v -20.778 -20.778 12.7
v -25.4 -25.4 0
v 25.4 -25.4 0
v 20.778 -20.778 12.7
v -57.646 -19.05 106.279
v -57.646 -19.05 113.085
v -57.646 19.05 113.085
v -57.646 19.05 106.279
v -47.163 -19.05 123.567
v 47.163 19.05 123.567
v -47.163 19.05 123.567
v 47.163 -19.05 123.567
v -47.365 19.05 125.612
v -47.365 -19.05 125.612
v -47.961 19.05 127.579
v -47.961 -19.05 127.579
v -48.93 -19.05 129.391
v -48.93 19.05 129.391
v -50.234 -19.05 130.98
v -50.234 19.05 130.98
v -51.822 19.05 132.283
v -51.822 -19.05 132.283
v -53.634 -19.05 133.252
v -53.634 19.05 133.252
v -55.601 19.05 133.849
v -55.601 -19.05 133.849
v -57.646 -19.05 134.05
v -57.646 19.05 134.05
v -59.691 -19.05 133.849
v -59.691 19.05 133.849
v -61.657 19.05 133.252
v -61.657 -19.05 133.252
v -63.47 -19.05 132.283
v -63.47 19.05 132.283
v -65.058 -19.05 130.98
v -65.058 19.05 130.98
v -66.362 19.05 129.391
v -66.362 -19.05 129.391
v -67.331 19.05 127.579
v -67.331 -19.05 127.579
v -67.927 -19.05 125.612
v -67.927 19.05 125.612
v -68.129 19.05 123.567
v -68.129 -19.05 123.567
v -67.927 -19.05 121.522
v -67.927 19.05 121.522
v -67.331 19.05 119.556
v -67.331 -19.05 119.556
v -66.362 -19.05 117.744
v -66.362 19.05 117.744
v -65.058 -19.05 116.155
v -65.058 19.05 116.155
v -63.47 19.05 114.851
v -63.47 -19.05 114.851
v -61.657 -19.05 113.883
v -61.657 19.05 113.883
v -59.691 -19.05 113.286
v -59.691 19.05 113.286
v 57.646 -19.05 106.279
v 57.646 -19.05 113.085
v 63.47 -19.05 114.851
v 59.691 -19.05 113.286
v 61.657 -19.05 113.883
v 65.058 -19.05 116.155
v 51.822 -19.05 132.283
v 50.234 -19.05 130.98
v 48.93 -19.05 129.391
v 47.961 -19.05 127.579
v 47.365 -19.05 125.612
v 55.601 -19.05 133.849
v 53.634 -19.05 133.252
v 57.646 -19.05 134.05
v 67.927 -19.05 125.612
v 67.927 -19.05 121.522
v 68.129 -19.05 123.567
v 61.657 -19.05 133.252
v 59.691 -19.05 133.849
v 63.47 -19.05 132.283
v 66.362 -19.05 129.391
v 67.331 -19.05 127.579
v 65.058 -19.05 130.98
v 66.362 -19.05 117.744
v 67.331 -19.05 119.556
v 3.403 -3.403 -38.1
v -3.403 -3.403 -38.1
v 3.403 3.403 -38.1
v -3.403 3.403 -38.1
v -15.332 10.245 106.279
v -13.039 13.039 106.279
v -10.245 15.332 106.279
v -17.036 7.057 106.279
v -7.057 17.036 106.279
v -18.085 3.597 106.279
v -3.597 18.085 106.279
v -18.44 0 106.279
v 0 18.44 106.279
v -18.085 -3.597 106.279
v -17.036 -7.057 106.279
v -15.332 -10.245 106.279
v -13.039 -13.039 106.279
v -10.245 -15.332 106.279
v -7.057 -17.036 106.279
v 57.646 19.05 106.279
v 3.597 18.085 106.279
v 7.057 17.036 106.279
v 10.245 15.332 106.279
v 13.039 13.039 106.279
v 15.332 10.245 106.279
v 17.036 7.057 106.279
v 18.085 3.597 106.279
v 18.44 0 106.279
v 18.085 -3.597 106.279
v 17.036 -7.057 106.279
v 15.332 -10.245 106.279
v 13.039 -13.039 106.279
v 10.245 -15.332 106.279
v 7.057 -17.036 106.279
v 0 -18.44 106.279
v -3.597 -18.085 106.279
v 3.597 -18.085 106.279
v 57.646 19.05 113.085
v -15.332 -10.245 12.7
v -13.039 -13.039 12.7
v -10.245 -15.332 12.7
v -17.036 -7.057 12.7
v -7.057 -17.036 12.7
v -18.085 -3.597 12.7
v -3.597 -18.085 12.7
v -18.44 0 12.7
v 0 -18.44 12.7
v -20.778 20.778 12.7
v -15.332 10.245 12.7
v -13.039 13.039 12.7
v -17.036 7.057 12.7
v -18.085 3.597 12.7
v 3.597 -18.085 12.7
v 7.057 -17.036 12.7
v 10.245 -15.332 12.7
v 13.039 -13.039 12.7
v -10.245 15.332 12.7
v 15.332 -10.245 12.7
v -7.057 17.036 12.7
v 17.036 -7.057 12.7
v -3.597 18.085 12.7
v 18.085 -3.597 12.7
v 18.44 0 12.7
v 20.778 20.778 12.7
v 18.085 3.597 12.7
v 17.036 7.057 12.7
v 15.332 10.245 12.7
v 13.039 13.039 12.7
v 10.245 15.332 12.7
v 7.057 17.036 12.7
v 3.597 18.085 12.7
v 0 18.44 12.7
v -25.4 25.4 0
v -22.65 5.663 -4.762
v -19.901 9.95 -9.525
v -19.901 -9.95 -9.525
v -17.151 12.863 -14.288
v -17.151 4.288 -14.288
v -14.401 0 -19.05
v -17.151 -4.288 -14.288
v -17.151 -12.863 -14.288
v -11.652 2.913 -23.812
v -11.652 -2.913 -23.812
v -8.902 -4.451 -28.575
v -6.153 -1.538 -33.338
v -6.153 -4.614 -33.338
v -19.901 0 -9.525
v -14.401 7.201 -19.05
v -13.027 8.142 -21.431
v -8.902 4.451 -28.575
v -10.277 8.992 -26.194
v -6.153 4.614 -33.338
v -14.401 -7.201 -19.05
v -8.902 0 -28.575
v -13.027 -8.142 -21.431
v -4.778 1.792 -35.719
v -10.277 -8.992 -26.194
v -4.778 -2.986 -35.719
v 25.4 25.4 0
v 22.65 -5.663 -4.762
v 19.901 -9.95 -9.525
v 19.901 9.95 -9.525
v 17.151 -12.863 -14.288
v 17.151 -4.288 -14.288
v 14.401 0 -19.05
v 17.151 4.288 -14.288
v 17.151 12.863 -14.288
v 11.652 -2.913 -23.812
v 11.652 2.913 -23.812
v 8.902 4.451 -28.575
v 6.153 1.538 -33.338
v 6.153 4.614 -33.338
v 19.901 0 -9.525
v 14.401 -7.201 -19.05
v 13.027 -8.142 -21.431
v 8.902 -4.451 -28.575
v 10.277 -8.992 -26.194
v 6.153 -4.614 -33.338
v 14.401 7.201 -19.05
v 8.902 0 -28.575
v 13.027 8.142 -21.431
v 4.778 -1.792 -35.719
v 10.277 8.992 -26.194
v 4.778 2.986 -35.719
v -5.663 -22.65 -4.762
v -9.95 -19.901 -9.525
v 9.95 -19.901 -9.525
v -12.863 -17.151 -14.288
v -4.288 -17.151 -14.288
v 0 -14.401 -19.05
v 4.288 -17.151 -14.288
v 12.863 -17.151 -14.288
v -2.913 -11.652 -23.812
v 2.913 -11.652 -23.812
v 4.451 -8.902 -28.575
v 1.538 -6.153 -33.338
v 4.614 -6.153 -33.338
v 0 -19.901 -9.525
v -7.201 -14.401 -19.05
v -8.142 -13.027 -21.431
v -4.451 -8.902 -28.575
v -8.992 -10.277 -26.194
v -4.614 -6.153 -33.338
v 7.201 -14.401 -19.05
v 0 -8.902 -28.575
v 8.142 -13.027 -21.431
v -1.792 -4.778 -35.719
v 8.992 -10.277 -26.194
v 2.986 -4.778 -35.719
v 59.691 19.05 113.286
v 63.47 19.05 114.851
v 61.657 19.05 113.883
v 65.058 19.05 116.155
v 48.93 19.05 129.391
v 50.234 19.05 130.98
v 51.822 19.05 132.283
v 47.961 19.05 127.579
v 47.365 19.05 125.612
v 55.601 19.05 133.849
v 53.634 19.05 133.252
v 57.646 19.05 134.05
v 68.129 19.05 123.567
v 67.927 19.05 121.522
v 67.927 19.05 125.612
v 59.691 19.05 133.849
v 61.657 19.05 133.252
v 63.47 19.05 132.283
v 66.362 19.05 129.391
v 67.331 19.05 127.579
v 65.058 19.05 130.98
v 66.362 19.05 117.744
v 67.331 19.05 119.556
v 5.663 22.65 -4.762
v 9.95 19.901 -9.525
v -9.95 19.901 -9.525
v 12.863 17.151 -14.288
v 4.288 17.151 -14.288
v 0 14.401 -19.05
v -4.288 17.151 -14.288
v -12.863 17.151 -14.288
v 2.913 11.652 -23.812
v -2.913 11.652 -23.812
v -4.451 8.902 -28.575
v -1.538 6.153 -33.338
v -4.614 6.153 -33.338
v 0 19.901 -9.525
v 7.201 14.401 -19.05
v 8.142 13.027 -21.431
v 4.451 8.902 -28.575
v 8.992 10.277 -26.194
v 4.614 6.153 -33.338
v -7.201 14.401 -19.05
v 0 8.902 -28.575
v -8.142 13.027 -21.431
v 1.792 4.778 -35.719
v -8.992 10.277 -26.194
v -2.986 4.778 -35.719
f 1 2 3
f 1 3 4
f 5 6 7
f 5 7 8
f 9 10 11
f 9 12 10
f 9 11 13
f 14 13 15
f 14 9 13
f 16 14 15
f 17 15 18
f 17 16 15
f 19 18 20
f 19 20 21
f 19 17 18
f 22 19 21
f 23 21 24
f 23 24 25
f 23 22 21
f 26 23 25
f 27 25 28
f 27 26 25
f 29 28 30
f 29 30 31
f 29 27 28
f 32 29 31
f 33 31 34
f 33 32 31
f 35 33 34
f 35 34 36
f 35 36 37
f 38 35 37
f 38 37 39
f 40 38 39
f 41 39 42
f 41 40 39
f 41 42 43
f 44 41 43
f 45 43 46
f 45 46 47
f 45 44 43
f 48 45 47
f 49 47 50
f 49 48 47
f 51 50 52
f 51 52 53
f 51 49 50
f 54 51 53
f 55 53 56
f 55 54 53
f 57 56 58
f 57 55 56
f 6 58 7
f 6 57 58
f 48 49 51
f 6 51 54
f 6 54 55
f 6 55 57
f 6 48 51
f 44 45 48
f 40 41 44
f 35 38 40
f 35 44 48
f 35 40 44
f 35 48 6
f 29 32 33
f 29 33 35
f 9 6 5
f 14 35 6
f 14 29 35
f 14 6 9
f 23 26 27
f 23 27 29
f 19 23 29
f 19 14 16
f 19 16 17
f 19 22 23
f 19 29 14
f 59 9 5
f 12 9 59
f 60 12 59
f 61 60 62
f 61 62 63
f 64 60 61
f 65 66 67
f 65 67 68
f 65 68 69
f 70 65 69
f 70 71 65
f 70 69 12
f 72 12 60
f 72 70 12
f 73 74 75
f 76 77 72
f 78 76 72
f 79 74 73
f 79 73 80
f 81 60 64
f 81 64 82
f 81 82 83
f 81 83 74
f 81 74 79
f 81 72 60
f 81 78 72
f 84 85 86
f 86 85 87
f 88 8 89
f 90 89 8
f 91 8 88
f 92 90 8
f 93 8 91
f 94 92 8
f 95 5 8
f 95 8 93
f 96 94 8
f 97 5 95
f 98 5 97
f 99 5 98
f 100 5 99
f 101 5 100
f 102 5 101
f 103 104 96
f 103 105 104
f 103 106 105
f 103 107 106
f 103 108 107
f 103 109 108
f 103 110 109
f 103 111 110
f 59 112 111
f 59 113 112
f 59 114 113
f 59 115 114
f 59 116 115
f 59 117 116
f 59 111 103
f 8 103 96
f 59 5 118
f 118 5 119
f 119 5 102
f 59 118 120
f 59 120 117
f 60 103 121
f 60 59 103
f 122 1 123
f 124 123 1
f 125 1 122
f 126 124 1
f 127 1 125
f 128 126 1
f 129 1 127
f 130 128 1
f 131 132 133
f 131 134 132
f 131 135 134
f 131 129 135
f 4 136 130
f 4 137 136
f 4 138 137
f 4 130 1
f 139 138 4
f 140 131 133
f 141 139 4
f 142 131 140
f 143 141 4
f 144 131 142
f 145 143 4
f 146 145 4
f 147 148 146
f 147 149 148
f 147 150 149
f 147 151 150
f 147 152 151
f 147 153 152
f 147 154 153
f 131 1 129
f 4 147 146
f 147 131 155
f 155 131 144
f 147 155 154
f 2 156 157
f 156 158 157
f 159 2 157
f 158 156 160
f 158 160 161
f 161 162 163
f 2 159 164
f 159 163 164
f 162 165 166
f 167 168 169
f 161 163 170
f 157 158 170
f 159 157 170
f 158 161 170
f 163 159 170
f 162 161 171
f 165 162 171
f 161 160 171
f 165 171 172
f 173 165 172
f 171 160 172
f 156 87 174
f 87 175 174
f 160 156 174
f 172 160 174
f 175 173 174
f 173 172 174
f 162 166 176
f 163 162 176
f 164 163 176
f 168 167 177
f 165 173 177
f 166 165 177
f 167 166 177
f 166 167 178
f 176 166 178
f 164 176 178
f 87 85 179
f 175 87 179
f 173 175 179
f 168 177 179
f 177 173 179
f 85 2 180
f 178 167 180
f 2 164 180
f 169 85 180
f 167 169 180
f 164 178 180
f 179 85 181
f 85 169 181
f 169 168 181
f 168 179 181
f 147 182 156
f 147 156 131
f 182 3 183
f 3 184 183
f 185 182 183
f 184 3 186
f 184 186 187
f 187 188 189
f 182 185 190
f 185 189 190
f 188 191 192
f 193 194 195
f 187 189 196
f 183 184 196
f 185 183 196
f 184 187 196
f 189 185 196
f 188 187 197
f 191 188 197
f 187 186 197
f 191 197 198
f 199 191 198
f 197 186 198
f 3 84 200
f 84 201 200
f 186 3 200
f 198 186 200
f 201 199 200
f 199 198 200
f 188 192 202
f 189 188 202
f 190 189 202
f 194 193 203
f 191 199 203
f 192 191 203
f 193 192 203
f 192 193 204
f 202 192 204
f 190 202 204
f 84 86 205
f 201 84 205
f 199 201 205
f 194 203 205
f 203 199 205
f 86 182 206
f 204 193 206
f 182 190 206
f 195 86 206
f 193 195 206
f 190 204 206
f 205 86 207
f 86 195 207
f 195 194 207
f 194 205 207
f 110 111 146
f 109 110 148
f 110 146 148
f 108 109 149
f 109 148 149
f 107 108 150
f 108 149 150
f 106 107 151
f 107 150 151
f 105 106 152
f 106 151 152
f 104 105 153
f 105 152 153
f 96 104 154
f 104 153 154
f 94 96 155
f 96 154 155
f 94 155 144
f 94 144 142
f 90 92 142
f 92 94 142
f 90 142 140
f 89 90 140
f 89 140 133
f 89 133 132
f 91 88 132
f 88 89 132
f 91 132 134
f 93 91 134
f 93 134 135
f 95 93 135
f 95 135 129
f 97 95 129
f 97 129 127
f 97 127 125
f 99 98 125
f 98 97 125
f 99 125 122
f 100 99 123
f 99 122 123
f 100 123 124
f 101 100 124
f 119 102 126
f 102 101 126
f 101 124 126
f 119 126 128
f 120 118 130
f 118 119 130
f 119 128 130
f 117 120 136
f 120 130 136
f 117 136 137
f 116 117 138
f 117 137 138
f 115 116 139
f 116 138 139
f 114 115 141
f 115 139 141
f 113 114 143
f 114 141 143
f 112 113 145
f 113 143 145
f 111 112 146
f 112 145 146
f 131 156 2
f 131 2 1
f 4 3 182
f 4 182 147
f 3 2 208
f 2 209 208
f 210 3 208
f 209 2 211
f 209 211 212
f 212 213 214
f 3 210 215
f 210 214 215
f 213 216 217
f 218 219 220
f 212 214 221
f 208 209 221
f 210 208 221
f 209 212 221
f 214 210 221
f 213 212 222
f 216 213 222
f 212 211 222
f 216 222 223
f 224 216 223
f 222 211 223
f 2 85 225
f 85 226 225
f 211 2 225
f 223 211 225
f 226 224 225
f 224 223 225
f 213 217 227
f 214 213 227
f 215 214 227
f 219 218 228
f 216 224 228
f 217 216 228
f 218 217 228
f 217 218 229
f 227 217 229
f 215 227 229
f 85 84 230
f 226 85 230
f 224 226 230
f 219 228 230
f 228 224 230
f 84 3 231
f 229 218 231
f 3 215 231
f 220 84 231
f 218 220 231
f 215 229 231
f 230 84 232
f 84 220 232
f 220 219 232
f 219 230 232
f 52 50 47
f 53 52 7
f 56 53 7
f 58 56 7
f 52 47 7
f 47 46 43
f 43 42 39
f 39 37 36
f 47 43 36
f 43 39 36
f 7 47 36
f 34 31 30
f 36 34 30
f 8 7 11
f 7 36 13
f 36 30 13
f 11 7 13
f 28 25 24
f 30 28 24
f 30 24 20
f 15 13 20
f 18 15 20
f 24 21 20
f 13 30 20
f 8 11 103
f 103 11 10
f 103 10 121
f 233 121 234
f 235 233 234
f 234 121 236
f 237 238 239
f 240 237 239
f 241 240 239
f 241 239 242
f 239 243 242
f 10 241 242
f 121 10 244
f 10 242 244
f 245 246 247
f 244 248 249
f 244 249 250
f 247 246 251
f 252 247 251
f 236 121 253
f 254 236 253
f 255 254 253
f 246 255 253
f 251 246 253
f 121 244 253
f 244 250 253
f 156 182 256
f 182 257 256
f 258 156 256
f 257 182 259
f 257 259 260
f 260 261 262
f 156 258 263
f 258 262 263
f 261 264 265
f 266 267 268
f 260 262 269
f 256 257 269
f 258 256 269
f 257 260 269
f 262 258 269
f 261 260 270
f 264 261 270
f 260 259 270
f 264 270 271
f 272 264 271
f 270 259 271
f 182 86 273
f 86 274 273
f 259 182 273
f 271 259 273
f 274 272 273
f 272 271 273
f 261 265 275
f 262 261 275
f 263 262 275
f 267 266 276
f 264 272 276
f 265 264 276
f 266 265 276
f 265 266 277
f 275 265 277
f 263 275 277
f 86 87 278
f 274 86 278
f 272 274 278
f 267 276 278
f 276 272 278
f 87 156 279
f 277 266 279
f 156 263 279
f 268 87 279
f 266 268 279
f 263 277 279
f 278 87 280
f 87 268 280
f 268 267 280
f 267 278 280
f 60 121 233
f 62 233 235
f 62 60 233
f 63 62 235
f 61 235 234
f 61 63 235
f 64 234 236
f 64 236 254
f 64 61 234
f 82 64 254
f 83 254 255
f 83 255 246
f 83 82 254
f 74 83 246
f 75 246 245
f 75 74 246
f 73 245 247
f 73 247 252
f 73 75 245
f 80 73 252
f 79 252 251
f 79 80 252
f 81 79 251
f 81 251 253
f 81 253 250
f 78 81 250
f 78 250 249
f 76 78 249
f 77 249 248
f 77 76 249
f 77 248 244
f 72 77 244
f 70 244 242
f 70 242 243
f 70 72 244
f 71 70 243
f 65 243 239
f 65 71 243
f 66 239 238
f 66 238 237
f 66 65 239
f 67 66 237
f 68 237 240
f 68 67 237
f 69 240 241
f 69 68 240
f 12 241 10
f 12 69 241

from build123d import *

# Parameters (mm, degrees)
F0_W      = 50.8
F0_H      = 50.8
F1_DEPTH  = 38.1
F1_TAPER  = 30
F1_FACE_W = 50.8
F1_FACE_H = 50.8
F2_DEPTH  = 12.7
F2_TAPER  = 20
F3_R      = 18.4397946344
F4_DEPTH  = 101.6
F6_DEPTH  = 19.05
F7_DEPTH  = 19.05


with BuildPart() as f1:
    # F0 (on Top) → F1 (new body)
    with BuildSketch(Plane.XY):
        Rectangle(F0_W, F0_H)
    extrude(amount=-F1_DEPTH, taper=F1_TAPER)

    # F1_face (on face) → F2 (join)
    with BuildSketch(Plane.XY):
        Rectangle(F1_FACE_W, F1_FACE_H)
    extrude(amount=F2_DEPTH, taper=F2_TAPER)

    # F3 (on face) → F4 (join)
    with BuildSketch(Plane.XY.offset(12.7)):
        Circle(F3_R)
    extrude(amount=F4_DEPTH)

    # F5 (on Front) → F6 (join, symmetric)
    with BuildSketch(Plane.XZ):
        with BuildLine():
            Line((47.1632888286, 123.5673576593), (-47.1632888286, 123.5673576593))
            ThreePointArc((-47.1632888286, 123.5673576593), (-65.0582543601, 130.9796950807), (-57.6459169388, 113.0847295492))
            Line((-57.6459169388, 113.0847295492), (-57.6459169388, 106.2794923782))
            Line((-57.6459169388, 106.2794923782), (57.6459169388, 106.2794923782))
            Line((57.6459169388, 106.2794923782), (57.6459169388, 113.0847295492))
            ThreePointArc((57.6459169388, 113.0847295492), (65.0582543601, 130.9796950807), (47.1632888286, 123.5673576593))
        make_face()
    extrude(amount=F6_DEPTH, both=True)

    # F5 (on Front) → F7 (join, symmetric)
    with BuildSketch(Plane.XZ):
        with BuildLine():
            Line((47.1632888286, 123.5673576593), (-47.1632888286, 123.5673576593))
            ThreePointArc((-47.1632888286, 123.5673576593), (-65.0582543601, 130.9796950807), (-57.6459169388, 113.0847295492))
            Line((-57.6459169388, 113.0847295492), (-57.6459169388, 106.2794923782))
            Line((-57.6459169388, 106.2794923782), (57.6459169388, 106.2794923782))
            Line((57.6459169388, 106.2794923782), (57.6459169388, 113.0847295492))
            ThreePointArc((57.6459169388, 113.0847295492), (65.0582543601, 130.9796950807), (47.1632888286, 123.5673576593))
        make_face()
    extrude(amount=F7_DEPTH, both=True)


solid = f1.part
